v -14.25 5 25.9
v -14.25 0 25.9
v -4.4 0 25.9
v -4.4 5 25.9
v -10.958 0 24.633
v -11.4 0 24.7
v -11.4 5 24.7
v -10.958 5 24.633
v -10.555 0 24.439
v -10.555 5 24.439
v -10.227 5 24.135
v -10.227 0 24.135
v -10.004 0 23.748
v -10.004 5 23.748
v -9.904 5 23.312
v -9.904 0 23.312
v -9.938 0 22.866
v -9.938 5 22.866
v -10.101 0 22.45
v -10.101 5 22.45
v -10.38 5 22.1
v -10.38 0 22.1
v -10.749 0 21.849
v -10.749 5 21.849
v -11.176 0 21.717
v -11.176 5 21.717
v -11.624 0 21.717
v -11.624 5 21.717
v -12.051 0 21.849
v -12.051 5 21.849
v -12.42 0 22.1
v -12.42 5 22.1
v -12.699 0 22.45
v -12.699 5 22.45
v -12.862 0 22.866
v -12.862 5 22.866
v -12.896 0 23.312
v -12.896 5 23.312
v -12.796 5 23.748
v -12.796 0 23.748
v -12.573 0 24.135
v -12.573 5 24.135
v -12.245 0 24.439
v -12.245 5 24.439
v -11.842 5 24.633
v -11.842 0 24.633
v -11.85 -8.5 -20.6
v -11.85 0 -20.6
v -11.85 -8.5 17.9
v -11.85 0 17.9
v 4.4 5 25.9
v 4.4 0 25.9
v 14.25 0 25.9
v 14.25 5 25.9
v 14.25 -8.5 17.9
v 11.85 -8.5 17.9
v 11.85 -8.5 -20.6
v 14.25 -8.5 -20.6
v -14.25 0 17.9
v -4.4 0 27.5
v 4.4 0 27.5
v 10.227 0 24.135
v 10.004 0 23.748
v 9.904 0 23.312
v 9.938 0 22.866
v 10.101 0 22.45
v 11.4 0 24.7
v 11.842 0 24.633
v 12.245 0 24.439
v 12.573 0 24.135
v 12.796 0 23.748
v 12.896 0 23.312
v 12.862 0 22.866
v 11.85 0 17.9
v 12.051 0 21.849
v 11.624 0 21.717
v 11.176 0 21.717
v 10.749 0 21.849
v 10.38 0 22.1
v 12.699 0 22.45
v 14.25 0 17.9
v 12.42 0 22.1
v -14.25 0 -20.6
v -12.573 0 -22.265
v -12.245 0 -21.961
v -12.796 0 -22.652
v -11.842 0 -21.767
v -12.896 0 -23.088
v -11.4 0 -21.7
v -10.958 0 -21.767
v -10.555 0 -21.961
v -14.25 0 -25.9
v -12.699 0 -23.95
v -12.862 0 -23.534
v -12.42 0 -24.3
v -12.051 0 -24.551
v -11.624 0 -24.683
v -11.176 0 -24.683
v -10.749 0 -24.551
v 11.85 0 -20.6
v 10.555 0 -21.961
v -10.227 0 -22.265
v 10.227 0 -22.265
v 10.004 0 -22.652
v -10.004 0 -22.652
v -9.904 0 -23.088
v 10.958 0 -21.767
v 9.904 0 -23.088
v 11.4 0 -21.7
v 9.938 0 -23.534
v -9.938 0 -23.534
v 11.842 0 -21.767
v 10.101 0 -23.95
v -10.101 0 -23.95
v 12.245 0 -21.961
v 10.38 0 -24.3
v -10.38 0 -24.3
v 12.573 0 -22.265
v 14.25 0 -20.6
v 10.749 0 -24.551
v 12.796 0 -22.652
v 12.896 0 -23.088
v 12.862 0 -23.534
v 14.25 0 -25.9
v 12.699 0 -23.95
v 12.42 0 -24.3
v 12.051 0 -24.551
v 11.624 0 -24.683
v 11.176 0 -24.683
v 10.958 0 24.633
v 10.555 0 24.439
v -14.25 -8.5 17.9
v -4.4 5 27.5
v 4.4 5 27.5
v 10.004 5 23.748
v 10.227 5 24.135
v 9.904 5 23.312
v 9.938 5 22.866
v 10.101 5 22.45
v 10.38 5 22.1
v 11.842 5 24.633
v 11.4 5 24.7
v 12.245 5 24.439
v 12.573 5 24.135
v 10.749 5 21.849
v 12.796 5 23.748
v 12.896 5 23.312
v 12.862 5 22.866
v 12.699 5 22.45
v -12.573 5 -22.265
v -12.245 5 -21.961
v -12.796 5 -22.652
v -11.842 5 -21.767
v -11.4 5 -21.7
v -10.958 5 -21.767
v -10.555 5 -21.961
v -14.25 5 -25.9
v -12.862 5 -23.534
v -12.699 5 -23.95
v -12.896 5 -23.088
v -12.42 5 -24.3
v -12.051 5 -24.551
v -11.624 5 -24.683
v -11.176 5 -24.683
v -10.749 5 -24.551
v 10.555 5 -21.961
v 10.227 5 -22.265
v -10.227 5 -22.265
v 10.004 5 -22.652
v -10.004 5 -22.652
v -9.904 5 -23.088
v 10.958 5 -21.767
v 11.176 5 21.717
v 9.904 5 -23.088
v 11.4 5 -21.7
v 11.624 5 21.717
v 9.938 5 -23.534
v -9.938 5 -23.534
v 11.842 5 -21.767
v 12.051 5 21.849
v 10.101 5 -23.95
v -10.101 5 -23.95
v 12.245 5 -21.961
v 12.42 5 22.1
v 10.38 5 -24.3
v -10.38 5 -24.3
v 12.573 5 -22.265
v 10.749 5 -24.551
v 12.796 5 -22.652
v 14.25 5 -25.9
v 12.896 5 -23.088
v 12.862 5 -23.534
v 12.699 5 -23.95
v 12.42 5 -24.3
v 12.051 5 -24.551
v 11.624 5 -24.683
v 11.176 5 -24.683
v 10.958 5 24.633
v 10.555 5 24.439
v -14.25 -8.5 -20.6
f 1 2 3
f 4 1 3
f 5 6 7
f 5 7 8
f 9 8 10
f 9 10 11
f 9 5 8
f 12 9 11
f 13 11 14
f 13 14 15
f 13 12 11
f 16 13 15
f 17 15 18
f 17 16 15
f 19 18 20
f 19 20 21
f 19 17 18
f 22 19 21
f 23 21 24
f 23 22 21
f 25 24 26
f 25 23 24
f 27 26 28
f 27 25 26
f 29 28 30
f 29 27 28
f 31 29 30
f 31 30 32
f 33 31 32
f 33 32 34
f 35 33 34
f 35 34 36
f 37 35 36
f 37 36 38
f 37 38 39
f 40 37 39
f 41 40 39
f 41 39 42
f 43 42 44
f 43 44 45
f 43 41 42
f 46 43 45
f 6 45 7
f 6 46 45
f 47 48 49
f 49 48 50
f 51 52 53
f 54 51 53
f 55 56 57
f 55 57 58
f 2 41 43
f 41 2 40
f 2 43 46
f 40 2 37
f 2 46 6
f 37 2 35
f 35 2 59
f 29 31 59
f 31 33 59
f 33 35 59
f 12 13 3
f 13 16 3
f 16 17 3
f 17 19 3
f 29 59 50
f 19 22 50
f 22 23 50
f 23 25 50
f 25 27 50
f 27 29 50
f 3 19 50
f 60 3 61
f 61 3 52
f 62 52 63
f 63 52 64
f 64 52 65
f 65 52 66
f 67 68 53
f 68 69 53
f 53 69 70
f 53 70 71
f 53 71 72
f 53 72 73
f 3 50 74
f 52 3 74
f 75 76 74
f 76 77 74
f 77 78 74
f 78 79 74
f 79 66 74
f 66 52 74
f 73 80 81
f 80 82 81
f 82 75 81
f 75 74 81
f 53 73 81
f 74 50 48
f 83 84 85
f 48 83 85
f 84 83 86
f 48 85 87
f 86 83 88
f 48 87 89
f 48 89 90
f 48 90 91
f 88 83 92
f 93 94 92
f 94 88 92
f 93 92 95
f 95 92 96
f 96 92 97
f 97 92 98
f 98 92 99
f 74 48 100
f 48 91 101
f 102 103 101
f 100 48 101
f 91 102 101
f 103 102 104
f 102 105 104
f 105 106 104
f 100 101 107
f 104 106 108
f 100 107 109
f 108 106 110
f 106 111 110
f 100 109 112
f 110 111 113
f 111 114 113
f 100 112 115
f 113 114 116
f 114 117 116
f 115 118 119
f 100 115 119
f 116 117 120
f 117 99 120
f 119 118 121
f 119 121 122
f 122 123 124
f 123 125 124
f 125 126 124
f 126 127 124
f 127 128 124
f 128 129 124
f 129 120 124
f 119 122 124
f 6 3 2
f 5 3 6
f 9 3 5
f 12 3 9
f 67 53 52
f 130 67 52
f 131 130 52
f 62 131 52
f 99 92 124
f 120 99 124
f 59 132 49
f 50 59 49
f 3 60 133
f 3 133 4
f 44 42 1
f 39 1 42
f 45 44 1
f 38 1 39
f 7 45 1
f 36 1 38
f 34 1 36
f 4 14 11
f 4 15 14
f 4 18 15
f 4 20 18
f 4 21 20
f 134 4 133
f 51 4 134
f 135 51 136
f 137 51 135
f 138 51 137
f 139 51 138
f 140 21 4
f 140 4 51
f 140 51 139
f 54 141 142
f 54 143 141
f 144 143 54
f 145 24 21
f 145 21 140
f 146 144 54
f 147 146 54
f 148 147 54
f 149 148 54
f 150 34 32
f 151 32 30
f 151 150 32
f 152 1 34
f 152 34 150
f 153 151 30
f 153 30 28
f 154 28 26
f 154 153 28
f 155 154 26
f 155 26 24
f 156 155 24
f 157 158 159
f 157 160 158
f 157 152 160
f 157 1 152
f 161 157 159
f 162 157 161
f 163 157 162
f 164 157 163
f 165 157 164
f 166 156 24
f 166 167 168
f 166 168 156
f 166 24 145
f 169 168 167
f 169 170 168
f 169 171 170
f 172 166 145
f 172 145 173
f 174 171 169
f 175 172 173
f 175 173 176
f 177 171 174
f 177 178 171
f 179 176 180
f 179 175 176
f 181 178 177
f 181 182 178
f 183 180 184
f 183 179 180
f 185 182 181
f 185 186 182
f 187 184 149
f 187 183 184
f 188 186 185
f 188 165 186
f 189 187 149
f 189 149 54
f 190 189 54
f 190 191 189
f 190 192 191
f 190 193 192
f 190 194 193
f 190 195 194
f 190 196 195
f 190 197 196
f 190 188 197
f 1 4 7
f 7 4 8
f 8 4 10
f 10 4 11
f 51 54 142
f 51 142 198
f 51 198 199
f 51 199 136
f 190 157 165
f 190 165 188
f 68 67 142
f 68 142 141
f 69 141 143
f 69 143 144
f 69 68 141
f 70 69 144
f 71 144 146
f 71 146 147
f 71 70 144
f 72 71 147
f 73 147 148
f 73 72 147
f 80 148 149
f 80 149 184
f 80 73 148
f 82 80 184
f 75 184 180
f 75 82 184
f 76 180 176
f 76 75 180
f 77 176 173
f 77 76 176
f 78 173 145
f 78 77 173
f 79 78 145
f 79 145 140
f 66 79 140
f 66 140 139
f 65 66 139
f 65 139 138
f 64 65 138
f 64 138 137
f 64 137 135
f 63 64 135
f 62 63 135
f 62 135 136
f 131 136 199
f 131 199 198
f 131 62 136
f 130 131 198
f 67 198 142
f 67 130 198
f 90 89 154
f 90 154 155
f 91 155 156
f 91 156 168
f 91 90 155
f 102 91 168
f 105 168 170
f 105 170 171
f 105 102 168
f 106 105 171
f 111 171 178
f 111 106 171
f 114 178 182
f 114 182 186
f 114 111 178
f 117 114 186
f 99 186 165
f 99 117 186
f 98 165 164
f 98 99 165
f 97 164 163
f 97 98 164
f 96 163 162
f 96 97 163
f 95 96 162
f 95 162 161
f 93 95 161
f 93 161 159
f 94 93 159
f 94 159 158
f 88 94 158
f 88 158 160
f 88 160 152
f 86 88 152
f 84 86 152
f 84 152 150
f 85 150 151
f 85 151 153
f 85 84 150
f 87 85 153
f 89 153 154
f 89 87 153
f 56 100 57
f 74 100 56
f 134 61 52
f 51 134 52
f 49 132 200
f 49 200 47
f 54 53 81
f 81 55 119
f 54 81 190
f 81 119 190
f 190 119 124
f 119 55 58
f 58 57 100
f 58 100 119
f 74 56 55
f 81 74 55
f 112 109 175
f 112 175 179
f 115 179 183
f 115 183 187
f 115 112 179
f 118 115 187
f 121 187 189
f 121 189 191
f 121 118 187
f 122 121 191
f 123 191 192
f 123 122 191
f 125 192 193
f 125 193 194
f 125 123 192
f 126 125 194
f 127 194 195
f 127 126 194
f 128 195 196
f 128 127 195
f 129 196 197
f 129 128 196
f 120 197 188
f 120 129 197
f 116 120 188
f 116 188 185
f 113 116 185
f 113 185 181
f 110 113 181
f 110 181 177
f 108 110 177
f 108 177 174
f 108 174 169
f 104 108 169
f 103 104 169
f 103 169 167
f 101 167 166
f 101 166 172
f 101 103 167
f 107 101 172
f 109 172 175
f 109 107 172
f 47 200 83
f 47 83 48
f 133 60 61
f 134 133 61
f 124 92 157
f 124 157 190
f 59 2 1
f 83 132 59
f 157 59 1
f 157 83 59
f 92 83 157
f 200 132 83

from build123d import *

# Parameters (mm, degrees)
SKETCH1_W           = 28.5
SKETCH1_H           = 51.8
SKETCH1_R           = 1.5
SKETCH1_W_2         = 8.8
SKETCH1_H_2         = 1.6
BOSS_EXTRUDE1_DEPTH = 5
SKETCH2_W           = 2.4
SKETCH2_H           = 38.5
BOSS_EXTRUDE2_DEPTH = 8.5


with BuildPart() as part:
    # Sketch1 → Boss-Extrude1 (new body)
    # profile 1 of 2: a face of its own
    with BuildSketch(Plane(origin=(0, 0, 0), x_dir=(1, 0, 0), z_dir=(0, 1, 0))):
        Rectangle(SKETCH1_W, SKETCH1_H)
        with Locations(Location((-11.4, -23.2, 0), (0, 0, 270))):
            Circle(SKETCH1_R, mode=Mode.SUBTRACT)
        with Locations(Location((11.4, -23.2, 0), (0, 0, 270))):
            Circle(SKETCH1_R, mode=Mode.SUBTRACT)
        with Locations(Location((11.4, 23.2, 0), (0, 0, 270))):
            Circle(SKETCH1_R, mode=Mode.SUBTRACT)
        with Locations(Location((-11.4, 23.2, 0), (0, 0, 270))):
            Circle(SKETCH1_R, mode=Mode.SUBTRACT)
    # profile 2 of 2: a face of its own
    with BuildSketch(Plane(origin=(0, 0, 0), x_dir=(1, 0, 0), z_dir=(0, 1, 0))):
        with Locations((0, -26.7)):
            Rectangle(SKETCH1_W_2, SKETCH1_H_2)
    extrude(amount=BOSS_EXTRUDE1_DEPTH)

    # Sketch2 → Boss-Extrude2 (add)
    with BuildSketch(Plane.XZ):
        with Locations((13.05, -1.35)):
            Rectangle(SKETCH2_W, SKETCH2_H)
        with Locations((-13.05, -1.35)):
            Rectangle(SKETCH2_W, SKETCH2_H)
    extrude(amount=BOSS_EXTRUDE2_DEPTH)


solid = part.part
